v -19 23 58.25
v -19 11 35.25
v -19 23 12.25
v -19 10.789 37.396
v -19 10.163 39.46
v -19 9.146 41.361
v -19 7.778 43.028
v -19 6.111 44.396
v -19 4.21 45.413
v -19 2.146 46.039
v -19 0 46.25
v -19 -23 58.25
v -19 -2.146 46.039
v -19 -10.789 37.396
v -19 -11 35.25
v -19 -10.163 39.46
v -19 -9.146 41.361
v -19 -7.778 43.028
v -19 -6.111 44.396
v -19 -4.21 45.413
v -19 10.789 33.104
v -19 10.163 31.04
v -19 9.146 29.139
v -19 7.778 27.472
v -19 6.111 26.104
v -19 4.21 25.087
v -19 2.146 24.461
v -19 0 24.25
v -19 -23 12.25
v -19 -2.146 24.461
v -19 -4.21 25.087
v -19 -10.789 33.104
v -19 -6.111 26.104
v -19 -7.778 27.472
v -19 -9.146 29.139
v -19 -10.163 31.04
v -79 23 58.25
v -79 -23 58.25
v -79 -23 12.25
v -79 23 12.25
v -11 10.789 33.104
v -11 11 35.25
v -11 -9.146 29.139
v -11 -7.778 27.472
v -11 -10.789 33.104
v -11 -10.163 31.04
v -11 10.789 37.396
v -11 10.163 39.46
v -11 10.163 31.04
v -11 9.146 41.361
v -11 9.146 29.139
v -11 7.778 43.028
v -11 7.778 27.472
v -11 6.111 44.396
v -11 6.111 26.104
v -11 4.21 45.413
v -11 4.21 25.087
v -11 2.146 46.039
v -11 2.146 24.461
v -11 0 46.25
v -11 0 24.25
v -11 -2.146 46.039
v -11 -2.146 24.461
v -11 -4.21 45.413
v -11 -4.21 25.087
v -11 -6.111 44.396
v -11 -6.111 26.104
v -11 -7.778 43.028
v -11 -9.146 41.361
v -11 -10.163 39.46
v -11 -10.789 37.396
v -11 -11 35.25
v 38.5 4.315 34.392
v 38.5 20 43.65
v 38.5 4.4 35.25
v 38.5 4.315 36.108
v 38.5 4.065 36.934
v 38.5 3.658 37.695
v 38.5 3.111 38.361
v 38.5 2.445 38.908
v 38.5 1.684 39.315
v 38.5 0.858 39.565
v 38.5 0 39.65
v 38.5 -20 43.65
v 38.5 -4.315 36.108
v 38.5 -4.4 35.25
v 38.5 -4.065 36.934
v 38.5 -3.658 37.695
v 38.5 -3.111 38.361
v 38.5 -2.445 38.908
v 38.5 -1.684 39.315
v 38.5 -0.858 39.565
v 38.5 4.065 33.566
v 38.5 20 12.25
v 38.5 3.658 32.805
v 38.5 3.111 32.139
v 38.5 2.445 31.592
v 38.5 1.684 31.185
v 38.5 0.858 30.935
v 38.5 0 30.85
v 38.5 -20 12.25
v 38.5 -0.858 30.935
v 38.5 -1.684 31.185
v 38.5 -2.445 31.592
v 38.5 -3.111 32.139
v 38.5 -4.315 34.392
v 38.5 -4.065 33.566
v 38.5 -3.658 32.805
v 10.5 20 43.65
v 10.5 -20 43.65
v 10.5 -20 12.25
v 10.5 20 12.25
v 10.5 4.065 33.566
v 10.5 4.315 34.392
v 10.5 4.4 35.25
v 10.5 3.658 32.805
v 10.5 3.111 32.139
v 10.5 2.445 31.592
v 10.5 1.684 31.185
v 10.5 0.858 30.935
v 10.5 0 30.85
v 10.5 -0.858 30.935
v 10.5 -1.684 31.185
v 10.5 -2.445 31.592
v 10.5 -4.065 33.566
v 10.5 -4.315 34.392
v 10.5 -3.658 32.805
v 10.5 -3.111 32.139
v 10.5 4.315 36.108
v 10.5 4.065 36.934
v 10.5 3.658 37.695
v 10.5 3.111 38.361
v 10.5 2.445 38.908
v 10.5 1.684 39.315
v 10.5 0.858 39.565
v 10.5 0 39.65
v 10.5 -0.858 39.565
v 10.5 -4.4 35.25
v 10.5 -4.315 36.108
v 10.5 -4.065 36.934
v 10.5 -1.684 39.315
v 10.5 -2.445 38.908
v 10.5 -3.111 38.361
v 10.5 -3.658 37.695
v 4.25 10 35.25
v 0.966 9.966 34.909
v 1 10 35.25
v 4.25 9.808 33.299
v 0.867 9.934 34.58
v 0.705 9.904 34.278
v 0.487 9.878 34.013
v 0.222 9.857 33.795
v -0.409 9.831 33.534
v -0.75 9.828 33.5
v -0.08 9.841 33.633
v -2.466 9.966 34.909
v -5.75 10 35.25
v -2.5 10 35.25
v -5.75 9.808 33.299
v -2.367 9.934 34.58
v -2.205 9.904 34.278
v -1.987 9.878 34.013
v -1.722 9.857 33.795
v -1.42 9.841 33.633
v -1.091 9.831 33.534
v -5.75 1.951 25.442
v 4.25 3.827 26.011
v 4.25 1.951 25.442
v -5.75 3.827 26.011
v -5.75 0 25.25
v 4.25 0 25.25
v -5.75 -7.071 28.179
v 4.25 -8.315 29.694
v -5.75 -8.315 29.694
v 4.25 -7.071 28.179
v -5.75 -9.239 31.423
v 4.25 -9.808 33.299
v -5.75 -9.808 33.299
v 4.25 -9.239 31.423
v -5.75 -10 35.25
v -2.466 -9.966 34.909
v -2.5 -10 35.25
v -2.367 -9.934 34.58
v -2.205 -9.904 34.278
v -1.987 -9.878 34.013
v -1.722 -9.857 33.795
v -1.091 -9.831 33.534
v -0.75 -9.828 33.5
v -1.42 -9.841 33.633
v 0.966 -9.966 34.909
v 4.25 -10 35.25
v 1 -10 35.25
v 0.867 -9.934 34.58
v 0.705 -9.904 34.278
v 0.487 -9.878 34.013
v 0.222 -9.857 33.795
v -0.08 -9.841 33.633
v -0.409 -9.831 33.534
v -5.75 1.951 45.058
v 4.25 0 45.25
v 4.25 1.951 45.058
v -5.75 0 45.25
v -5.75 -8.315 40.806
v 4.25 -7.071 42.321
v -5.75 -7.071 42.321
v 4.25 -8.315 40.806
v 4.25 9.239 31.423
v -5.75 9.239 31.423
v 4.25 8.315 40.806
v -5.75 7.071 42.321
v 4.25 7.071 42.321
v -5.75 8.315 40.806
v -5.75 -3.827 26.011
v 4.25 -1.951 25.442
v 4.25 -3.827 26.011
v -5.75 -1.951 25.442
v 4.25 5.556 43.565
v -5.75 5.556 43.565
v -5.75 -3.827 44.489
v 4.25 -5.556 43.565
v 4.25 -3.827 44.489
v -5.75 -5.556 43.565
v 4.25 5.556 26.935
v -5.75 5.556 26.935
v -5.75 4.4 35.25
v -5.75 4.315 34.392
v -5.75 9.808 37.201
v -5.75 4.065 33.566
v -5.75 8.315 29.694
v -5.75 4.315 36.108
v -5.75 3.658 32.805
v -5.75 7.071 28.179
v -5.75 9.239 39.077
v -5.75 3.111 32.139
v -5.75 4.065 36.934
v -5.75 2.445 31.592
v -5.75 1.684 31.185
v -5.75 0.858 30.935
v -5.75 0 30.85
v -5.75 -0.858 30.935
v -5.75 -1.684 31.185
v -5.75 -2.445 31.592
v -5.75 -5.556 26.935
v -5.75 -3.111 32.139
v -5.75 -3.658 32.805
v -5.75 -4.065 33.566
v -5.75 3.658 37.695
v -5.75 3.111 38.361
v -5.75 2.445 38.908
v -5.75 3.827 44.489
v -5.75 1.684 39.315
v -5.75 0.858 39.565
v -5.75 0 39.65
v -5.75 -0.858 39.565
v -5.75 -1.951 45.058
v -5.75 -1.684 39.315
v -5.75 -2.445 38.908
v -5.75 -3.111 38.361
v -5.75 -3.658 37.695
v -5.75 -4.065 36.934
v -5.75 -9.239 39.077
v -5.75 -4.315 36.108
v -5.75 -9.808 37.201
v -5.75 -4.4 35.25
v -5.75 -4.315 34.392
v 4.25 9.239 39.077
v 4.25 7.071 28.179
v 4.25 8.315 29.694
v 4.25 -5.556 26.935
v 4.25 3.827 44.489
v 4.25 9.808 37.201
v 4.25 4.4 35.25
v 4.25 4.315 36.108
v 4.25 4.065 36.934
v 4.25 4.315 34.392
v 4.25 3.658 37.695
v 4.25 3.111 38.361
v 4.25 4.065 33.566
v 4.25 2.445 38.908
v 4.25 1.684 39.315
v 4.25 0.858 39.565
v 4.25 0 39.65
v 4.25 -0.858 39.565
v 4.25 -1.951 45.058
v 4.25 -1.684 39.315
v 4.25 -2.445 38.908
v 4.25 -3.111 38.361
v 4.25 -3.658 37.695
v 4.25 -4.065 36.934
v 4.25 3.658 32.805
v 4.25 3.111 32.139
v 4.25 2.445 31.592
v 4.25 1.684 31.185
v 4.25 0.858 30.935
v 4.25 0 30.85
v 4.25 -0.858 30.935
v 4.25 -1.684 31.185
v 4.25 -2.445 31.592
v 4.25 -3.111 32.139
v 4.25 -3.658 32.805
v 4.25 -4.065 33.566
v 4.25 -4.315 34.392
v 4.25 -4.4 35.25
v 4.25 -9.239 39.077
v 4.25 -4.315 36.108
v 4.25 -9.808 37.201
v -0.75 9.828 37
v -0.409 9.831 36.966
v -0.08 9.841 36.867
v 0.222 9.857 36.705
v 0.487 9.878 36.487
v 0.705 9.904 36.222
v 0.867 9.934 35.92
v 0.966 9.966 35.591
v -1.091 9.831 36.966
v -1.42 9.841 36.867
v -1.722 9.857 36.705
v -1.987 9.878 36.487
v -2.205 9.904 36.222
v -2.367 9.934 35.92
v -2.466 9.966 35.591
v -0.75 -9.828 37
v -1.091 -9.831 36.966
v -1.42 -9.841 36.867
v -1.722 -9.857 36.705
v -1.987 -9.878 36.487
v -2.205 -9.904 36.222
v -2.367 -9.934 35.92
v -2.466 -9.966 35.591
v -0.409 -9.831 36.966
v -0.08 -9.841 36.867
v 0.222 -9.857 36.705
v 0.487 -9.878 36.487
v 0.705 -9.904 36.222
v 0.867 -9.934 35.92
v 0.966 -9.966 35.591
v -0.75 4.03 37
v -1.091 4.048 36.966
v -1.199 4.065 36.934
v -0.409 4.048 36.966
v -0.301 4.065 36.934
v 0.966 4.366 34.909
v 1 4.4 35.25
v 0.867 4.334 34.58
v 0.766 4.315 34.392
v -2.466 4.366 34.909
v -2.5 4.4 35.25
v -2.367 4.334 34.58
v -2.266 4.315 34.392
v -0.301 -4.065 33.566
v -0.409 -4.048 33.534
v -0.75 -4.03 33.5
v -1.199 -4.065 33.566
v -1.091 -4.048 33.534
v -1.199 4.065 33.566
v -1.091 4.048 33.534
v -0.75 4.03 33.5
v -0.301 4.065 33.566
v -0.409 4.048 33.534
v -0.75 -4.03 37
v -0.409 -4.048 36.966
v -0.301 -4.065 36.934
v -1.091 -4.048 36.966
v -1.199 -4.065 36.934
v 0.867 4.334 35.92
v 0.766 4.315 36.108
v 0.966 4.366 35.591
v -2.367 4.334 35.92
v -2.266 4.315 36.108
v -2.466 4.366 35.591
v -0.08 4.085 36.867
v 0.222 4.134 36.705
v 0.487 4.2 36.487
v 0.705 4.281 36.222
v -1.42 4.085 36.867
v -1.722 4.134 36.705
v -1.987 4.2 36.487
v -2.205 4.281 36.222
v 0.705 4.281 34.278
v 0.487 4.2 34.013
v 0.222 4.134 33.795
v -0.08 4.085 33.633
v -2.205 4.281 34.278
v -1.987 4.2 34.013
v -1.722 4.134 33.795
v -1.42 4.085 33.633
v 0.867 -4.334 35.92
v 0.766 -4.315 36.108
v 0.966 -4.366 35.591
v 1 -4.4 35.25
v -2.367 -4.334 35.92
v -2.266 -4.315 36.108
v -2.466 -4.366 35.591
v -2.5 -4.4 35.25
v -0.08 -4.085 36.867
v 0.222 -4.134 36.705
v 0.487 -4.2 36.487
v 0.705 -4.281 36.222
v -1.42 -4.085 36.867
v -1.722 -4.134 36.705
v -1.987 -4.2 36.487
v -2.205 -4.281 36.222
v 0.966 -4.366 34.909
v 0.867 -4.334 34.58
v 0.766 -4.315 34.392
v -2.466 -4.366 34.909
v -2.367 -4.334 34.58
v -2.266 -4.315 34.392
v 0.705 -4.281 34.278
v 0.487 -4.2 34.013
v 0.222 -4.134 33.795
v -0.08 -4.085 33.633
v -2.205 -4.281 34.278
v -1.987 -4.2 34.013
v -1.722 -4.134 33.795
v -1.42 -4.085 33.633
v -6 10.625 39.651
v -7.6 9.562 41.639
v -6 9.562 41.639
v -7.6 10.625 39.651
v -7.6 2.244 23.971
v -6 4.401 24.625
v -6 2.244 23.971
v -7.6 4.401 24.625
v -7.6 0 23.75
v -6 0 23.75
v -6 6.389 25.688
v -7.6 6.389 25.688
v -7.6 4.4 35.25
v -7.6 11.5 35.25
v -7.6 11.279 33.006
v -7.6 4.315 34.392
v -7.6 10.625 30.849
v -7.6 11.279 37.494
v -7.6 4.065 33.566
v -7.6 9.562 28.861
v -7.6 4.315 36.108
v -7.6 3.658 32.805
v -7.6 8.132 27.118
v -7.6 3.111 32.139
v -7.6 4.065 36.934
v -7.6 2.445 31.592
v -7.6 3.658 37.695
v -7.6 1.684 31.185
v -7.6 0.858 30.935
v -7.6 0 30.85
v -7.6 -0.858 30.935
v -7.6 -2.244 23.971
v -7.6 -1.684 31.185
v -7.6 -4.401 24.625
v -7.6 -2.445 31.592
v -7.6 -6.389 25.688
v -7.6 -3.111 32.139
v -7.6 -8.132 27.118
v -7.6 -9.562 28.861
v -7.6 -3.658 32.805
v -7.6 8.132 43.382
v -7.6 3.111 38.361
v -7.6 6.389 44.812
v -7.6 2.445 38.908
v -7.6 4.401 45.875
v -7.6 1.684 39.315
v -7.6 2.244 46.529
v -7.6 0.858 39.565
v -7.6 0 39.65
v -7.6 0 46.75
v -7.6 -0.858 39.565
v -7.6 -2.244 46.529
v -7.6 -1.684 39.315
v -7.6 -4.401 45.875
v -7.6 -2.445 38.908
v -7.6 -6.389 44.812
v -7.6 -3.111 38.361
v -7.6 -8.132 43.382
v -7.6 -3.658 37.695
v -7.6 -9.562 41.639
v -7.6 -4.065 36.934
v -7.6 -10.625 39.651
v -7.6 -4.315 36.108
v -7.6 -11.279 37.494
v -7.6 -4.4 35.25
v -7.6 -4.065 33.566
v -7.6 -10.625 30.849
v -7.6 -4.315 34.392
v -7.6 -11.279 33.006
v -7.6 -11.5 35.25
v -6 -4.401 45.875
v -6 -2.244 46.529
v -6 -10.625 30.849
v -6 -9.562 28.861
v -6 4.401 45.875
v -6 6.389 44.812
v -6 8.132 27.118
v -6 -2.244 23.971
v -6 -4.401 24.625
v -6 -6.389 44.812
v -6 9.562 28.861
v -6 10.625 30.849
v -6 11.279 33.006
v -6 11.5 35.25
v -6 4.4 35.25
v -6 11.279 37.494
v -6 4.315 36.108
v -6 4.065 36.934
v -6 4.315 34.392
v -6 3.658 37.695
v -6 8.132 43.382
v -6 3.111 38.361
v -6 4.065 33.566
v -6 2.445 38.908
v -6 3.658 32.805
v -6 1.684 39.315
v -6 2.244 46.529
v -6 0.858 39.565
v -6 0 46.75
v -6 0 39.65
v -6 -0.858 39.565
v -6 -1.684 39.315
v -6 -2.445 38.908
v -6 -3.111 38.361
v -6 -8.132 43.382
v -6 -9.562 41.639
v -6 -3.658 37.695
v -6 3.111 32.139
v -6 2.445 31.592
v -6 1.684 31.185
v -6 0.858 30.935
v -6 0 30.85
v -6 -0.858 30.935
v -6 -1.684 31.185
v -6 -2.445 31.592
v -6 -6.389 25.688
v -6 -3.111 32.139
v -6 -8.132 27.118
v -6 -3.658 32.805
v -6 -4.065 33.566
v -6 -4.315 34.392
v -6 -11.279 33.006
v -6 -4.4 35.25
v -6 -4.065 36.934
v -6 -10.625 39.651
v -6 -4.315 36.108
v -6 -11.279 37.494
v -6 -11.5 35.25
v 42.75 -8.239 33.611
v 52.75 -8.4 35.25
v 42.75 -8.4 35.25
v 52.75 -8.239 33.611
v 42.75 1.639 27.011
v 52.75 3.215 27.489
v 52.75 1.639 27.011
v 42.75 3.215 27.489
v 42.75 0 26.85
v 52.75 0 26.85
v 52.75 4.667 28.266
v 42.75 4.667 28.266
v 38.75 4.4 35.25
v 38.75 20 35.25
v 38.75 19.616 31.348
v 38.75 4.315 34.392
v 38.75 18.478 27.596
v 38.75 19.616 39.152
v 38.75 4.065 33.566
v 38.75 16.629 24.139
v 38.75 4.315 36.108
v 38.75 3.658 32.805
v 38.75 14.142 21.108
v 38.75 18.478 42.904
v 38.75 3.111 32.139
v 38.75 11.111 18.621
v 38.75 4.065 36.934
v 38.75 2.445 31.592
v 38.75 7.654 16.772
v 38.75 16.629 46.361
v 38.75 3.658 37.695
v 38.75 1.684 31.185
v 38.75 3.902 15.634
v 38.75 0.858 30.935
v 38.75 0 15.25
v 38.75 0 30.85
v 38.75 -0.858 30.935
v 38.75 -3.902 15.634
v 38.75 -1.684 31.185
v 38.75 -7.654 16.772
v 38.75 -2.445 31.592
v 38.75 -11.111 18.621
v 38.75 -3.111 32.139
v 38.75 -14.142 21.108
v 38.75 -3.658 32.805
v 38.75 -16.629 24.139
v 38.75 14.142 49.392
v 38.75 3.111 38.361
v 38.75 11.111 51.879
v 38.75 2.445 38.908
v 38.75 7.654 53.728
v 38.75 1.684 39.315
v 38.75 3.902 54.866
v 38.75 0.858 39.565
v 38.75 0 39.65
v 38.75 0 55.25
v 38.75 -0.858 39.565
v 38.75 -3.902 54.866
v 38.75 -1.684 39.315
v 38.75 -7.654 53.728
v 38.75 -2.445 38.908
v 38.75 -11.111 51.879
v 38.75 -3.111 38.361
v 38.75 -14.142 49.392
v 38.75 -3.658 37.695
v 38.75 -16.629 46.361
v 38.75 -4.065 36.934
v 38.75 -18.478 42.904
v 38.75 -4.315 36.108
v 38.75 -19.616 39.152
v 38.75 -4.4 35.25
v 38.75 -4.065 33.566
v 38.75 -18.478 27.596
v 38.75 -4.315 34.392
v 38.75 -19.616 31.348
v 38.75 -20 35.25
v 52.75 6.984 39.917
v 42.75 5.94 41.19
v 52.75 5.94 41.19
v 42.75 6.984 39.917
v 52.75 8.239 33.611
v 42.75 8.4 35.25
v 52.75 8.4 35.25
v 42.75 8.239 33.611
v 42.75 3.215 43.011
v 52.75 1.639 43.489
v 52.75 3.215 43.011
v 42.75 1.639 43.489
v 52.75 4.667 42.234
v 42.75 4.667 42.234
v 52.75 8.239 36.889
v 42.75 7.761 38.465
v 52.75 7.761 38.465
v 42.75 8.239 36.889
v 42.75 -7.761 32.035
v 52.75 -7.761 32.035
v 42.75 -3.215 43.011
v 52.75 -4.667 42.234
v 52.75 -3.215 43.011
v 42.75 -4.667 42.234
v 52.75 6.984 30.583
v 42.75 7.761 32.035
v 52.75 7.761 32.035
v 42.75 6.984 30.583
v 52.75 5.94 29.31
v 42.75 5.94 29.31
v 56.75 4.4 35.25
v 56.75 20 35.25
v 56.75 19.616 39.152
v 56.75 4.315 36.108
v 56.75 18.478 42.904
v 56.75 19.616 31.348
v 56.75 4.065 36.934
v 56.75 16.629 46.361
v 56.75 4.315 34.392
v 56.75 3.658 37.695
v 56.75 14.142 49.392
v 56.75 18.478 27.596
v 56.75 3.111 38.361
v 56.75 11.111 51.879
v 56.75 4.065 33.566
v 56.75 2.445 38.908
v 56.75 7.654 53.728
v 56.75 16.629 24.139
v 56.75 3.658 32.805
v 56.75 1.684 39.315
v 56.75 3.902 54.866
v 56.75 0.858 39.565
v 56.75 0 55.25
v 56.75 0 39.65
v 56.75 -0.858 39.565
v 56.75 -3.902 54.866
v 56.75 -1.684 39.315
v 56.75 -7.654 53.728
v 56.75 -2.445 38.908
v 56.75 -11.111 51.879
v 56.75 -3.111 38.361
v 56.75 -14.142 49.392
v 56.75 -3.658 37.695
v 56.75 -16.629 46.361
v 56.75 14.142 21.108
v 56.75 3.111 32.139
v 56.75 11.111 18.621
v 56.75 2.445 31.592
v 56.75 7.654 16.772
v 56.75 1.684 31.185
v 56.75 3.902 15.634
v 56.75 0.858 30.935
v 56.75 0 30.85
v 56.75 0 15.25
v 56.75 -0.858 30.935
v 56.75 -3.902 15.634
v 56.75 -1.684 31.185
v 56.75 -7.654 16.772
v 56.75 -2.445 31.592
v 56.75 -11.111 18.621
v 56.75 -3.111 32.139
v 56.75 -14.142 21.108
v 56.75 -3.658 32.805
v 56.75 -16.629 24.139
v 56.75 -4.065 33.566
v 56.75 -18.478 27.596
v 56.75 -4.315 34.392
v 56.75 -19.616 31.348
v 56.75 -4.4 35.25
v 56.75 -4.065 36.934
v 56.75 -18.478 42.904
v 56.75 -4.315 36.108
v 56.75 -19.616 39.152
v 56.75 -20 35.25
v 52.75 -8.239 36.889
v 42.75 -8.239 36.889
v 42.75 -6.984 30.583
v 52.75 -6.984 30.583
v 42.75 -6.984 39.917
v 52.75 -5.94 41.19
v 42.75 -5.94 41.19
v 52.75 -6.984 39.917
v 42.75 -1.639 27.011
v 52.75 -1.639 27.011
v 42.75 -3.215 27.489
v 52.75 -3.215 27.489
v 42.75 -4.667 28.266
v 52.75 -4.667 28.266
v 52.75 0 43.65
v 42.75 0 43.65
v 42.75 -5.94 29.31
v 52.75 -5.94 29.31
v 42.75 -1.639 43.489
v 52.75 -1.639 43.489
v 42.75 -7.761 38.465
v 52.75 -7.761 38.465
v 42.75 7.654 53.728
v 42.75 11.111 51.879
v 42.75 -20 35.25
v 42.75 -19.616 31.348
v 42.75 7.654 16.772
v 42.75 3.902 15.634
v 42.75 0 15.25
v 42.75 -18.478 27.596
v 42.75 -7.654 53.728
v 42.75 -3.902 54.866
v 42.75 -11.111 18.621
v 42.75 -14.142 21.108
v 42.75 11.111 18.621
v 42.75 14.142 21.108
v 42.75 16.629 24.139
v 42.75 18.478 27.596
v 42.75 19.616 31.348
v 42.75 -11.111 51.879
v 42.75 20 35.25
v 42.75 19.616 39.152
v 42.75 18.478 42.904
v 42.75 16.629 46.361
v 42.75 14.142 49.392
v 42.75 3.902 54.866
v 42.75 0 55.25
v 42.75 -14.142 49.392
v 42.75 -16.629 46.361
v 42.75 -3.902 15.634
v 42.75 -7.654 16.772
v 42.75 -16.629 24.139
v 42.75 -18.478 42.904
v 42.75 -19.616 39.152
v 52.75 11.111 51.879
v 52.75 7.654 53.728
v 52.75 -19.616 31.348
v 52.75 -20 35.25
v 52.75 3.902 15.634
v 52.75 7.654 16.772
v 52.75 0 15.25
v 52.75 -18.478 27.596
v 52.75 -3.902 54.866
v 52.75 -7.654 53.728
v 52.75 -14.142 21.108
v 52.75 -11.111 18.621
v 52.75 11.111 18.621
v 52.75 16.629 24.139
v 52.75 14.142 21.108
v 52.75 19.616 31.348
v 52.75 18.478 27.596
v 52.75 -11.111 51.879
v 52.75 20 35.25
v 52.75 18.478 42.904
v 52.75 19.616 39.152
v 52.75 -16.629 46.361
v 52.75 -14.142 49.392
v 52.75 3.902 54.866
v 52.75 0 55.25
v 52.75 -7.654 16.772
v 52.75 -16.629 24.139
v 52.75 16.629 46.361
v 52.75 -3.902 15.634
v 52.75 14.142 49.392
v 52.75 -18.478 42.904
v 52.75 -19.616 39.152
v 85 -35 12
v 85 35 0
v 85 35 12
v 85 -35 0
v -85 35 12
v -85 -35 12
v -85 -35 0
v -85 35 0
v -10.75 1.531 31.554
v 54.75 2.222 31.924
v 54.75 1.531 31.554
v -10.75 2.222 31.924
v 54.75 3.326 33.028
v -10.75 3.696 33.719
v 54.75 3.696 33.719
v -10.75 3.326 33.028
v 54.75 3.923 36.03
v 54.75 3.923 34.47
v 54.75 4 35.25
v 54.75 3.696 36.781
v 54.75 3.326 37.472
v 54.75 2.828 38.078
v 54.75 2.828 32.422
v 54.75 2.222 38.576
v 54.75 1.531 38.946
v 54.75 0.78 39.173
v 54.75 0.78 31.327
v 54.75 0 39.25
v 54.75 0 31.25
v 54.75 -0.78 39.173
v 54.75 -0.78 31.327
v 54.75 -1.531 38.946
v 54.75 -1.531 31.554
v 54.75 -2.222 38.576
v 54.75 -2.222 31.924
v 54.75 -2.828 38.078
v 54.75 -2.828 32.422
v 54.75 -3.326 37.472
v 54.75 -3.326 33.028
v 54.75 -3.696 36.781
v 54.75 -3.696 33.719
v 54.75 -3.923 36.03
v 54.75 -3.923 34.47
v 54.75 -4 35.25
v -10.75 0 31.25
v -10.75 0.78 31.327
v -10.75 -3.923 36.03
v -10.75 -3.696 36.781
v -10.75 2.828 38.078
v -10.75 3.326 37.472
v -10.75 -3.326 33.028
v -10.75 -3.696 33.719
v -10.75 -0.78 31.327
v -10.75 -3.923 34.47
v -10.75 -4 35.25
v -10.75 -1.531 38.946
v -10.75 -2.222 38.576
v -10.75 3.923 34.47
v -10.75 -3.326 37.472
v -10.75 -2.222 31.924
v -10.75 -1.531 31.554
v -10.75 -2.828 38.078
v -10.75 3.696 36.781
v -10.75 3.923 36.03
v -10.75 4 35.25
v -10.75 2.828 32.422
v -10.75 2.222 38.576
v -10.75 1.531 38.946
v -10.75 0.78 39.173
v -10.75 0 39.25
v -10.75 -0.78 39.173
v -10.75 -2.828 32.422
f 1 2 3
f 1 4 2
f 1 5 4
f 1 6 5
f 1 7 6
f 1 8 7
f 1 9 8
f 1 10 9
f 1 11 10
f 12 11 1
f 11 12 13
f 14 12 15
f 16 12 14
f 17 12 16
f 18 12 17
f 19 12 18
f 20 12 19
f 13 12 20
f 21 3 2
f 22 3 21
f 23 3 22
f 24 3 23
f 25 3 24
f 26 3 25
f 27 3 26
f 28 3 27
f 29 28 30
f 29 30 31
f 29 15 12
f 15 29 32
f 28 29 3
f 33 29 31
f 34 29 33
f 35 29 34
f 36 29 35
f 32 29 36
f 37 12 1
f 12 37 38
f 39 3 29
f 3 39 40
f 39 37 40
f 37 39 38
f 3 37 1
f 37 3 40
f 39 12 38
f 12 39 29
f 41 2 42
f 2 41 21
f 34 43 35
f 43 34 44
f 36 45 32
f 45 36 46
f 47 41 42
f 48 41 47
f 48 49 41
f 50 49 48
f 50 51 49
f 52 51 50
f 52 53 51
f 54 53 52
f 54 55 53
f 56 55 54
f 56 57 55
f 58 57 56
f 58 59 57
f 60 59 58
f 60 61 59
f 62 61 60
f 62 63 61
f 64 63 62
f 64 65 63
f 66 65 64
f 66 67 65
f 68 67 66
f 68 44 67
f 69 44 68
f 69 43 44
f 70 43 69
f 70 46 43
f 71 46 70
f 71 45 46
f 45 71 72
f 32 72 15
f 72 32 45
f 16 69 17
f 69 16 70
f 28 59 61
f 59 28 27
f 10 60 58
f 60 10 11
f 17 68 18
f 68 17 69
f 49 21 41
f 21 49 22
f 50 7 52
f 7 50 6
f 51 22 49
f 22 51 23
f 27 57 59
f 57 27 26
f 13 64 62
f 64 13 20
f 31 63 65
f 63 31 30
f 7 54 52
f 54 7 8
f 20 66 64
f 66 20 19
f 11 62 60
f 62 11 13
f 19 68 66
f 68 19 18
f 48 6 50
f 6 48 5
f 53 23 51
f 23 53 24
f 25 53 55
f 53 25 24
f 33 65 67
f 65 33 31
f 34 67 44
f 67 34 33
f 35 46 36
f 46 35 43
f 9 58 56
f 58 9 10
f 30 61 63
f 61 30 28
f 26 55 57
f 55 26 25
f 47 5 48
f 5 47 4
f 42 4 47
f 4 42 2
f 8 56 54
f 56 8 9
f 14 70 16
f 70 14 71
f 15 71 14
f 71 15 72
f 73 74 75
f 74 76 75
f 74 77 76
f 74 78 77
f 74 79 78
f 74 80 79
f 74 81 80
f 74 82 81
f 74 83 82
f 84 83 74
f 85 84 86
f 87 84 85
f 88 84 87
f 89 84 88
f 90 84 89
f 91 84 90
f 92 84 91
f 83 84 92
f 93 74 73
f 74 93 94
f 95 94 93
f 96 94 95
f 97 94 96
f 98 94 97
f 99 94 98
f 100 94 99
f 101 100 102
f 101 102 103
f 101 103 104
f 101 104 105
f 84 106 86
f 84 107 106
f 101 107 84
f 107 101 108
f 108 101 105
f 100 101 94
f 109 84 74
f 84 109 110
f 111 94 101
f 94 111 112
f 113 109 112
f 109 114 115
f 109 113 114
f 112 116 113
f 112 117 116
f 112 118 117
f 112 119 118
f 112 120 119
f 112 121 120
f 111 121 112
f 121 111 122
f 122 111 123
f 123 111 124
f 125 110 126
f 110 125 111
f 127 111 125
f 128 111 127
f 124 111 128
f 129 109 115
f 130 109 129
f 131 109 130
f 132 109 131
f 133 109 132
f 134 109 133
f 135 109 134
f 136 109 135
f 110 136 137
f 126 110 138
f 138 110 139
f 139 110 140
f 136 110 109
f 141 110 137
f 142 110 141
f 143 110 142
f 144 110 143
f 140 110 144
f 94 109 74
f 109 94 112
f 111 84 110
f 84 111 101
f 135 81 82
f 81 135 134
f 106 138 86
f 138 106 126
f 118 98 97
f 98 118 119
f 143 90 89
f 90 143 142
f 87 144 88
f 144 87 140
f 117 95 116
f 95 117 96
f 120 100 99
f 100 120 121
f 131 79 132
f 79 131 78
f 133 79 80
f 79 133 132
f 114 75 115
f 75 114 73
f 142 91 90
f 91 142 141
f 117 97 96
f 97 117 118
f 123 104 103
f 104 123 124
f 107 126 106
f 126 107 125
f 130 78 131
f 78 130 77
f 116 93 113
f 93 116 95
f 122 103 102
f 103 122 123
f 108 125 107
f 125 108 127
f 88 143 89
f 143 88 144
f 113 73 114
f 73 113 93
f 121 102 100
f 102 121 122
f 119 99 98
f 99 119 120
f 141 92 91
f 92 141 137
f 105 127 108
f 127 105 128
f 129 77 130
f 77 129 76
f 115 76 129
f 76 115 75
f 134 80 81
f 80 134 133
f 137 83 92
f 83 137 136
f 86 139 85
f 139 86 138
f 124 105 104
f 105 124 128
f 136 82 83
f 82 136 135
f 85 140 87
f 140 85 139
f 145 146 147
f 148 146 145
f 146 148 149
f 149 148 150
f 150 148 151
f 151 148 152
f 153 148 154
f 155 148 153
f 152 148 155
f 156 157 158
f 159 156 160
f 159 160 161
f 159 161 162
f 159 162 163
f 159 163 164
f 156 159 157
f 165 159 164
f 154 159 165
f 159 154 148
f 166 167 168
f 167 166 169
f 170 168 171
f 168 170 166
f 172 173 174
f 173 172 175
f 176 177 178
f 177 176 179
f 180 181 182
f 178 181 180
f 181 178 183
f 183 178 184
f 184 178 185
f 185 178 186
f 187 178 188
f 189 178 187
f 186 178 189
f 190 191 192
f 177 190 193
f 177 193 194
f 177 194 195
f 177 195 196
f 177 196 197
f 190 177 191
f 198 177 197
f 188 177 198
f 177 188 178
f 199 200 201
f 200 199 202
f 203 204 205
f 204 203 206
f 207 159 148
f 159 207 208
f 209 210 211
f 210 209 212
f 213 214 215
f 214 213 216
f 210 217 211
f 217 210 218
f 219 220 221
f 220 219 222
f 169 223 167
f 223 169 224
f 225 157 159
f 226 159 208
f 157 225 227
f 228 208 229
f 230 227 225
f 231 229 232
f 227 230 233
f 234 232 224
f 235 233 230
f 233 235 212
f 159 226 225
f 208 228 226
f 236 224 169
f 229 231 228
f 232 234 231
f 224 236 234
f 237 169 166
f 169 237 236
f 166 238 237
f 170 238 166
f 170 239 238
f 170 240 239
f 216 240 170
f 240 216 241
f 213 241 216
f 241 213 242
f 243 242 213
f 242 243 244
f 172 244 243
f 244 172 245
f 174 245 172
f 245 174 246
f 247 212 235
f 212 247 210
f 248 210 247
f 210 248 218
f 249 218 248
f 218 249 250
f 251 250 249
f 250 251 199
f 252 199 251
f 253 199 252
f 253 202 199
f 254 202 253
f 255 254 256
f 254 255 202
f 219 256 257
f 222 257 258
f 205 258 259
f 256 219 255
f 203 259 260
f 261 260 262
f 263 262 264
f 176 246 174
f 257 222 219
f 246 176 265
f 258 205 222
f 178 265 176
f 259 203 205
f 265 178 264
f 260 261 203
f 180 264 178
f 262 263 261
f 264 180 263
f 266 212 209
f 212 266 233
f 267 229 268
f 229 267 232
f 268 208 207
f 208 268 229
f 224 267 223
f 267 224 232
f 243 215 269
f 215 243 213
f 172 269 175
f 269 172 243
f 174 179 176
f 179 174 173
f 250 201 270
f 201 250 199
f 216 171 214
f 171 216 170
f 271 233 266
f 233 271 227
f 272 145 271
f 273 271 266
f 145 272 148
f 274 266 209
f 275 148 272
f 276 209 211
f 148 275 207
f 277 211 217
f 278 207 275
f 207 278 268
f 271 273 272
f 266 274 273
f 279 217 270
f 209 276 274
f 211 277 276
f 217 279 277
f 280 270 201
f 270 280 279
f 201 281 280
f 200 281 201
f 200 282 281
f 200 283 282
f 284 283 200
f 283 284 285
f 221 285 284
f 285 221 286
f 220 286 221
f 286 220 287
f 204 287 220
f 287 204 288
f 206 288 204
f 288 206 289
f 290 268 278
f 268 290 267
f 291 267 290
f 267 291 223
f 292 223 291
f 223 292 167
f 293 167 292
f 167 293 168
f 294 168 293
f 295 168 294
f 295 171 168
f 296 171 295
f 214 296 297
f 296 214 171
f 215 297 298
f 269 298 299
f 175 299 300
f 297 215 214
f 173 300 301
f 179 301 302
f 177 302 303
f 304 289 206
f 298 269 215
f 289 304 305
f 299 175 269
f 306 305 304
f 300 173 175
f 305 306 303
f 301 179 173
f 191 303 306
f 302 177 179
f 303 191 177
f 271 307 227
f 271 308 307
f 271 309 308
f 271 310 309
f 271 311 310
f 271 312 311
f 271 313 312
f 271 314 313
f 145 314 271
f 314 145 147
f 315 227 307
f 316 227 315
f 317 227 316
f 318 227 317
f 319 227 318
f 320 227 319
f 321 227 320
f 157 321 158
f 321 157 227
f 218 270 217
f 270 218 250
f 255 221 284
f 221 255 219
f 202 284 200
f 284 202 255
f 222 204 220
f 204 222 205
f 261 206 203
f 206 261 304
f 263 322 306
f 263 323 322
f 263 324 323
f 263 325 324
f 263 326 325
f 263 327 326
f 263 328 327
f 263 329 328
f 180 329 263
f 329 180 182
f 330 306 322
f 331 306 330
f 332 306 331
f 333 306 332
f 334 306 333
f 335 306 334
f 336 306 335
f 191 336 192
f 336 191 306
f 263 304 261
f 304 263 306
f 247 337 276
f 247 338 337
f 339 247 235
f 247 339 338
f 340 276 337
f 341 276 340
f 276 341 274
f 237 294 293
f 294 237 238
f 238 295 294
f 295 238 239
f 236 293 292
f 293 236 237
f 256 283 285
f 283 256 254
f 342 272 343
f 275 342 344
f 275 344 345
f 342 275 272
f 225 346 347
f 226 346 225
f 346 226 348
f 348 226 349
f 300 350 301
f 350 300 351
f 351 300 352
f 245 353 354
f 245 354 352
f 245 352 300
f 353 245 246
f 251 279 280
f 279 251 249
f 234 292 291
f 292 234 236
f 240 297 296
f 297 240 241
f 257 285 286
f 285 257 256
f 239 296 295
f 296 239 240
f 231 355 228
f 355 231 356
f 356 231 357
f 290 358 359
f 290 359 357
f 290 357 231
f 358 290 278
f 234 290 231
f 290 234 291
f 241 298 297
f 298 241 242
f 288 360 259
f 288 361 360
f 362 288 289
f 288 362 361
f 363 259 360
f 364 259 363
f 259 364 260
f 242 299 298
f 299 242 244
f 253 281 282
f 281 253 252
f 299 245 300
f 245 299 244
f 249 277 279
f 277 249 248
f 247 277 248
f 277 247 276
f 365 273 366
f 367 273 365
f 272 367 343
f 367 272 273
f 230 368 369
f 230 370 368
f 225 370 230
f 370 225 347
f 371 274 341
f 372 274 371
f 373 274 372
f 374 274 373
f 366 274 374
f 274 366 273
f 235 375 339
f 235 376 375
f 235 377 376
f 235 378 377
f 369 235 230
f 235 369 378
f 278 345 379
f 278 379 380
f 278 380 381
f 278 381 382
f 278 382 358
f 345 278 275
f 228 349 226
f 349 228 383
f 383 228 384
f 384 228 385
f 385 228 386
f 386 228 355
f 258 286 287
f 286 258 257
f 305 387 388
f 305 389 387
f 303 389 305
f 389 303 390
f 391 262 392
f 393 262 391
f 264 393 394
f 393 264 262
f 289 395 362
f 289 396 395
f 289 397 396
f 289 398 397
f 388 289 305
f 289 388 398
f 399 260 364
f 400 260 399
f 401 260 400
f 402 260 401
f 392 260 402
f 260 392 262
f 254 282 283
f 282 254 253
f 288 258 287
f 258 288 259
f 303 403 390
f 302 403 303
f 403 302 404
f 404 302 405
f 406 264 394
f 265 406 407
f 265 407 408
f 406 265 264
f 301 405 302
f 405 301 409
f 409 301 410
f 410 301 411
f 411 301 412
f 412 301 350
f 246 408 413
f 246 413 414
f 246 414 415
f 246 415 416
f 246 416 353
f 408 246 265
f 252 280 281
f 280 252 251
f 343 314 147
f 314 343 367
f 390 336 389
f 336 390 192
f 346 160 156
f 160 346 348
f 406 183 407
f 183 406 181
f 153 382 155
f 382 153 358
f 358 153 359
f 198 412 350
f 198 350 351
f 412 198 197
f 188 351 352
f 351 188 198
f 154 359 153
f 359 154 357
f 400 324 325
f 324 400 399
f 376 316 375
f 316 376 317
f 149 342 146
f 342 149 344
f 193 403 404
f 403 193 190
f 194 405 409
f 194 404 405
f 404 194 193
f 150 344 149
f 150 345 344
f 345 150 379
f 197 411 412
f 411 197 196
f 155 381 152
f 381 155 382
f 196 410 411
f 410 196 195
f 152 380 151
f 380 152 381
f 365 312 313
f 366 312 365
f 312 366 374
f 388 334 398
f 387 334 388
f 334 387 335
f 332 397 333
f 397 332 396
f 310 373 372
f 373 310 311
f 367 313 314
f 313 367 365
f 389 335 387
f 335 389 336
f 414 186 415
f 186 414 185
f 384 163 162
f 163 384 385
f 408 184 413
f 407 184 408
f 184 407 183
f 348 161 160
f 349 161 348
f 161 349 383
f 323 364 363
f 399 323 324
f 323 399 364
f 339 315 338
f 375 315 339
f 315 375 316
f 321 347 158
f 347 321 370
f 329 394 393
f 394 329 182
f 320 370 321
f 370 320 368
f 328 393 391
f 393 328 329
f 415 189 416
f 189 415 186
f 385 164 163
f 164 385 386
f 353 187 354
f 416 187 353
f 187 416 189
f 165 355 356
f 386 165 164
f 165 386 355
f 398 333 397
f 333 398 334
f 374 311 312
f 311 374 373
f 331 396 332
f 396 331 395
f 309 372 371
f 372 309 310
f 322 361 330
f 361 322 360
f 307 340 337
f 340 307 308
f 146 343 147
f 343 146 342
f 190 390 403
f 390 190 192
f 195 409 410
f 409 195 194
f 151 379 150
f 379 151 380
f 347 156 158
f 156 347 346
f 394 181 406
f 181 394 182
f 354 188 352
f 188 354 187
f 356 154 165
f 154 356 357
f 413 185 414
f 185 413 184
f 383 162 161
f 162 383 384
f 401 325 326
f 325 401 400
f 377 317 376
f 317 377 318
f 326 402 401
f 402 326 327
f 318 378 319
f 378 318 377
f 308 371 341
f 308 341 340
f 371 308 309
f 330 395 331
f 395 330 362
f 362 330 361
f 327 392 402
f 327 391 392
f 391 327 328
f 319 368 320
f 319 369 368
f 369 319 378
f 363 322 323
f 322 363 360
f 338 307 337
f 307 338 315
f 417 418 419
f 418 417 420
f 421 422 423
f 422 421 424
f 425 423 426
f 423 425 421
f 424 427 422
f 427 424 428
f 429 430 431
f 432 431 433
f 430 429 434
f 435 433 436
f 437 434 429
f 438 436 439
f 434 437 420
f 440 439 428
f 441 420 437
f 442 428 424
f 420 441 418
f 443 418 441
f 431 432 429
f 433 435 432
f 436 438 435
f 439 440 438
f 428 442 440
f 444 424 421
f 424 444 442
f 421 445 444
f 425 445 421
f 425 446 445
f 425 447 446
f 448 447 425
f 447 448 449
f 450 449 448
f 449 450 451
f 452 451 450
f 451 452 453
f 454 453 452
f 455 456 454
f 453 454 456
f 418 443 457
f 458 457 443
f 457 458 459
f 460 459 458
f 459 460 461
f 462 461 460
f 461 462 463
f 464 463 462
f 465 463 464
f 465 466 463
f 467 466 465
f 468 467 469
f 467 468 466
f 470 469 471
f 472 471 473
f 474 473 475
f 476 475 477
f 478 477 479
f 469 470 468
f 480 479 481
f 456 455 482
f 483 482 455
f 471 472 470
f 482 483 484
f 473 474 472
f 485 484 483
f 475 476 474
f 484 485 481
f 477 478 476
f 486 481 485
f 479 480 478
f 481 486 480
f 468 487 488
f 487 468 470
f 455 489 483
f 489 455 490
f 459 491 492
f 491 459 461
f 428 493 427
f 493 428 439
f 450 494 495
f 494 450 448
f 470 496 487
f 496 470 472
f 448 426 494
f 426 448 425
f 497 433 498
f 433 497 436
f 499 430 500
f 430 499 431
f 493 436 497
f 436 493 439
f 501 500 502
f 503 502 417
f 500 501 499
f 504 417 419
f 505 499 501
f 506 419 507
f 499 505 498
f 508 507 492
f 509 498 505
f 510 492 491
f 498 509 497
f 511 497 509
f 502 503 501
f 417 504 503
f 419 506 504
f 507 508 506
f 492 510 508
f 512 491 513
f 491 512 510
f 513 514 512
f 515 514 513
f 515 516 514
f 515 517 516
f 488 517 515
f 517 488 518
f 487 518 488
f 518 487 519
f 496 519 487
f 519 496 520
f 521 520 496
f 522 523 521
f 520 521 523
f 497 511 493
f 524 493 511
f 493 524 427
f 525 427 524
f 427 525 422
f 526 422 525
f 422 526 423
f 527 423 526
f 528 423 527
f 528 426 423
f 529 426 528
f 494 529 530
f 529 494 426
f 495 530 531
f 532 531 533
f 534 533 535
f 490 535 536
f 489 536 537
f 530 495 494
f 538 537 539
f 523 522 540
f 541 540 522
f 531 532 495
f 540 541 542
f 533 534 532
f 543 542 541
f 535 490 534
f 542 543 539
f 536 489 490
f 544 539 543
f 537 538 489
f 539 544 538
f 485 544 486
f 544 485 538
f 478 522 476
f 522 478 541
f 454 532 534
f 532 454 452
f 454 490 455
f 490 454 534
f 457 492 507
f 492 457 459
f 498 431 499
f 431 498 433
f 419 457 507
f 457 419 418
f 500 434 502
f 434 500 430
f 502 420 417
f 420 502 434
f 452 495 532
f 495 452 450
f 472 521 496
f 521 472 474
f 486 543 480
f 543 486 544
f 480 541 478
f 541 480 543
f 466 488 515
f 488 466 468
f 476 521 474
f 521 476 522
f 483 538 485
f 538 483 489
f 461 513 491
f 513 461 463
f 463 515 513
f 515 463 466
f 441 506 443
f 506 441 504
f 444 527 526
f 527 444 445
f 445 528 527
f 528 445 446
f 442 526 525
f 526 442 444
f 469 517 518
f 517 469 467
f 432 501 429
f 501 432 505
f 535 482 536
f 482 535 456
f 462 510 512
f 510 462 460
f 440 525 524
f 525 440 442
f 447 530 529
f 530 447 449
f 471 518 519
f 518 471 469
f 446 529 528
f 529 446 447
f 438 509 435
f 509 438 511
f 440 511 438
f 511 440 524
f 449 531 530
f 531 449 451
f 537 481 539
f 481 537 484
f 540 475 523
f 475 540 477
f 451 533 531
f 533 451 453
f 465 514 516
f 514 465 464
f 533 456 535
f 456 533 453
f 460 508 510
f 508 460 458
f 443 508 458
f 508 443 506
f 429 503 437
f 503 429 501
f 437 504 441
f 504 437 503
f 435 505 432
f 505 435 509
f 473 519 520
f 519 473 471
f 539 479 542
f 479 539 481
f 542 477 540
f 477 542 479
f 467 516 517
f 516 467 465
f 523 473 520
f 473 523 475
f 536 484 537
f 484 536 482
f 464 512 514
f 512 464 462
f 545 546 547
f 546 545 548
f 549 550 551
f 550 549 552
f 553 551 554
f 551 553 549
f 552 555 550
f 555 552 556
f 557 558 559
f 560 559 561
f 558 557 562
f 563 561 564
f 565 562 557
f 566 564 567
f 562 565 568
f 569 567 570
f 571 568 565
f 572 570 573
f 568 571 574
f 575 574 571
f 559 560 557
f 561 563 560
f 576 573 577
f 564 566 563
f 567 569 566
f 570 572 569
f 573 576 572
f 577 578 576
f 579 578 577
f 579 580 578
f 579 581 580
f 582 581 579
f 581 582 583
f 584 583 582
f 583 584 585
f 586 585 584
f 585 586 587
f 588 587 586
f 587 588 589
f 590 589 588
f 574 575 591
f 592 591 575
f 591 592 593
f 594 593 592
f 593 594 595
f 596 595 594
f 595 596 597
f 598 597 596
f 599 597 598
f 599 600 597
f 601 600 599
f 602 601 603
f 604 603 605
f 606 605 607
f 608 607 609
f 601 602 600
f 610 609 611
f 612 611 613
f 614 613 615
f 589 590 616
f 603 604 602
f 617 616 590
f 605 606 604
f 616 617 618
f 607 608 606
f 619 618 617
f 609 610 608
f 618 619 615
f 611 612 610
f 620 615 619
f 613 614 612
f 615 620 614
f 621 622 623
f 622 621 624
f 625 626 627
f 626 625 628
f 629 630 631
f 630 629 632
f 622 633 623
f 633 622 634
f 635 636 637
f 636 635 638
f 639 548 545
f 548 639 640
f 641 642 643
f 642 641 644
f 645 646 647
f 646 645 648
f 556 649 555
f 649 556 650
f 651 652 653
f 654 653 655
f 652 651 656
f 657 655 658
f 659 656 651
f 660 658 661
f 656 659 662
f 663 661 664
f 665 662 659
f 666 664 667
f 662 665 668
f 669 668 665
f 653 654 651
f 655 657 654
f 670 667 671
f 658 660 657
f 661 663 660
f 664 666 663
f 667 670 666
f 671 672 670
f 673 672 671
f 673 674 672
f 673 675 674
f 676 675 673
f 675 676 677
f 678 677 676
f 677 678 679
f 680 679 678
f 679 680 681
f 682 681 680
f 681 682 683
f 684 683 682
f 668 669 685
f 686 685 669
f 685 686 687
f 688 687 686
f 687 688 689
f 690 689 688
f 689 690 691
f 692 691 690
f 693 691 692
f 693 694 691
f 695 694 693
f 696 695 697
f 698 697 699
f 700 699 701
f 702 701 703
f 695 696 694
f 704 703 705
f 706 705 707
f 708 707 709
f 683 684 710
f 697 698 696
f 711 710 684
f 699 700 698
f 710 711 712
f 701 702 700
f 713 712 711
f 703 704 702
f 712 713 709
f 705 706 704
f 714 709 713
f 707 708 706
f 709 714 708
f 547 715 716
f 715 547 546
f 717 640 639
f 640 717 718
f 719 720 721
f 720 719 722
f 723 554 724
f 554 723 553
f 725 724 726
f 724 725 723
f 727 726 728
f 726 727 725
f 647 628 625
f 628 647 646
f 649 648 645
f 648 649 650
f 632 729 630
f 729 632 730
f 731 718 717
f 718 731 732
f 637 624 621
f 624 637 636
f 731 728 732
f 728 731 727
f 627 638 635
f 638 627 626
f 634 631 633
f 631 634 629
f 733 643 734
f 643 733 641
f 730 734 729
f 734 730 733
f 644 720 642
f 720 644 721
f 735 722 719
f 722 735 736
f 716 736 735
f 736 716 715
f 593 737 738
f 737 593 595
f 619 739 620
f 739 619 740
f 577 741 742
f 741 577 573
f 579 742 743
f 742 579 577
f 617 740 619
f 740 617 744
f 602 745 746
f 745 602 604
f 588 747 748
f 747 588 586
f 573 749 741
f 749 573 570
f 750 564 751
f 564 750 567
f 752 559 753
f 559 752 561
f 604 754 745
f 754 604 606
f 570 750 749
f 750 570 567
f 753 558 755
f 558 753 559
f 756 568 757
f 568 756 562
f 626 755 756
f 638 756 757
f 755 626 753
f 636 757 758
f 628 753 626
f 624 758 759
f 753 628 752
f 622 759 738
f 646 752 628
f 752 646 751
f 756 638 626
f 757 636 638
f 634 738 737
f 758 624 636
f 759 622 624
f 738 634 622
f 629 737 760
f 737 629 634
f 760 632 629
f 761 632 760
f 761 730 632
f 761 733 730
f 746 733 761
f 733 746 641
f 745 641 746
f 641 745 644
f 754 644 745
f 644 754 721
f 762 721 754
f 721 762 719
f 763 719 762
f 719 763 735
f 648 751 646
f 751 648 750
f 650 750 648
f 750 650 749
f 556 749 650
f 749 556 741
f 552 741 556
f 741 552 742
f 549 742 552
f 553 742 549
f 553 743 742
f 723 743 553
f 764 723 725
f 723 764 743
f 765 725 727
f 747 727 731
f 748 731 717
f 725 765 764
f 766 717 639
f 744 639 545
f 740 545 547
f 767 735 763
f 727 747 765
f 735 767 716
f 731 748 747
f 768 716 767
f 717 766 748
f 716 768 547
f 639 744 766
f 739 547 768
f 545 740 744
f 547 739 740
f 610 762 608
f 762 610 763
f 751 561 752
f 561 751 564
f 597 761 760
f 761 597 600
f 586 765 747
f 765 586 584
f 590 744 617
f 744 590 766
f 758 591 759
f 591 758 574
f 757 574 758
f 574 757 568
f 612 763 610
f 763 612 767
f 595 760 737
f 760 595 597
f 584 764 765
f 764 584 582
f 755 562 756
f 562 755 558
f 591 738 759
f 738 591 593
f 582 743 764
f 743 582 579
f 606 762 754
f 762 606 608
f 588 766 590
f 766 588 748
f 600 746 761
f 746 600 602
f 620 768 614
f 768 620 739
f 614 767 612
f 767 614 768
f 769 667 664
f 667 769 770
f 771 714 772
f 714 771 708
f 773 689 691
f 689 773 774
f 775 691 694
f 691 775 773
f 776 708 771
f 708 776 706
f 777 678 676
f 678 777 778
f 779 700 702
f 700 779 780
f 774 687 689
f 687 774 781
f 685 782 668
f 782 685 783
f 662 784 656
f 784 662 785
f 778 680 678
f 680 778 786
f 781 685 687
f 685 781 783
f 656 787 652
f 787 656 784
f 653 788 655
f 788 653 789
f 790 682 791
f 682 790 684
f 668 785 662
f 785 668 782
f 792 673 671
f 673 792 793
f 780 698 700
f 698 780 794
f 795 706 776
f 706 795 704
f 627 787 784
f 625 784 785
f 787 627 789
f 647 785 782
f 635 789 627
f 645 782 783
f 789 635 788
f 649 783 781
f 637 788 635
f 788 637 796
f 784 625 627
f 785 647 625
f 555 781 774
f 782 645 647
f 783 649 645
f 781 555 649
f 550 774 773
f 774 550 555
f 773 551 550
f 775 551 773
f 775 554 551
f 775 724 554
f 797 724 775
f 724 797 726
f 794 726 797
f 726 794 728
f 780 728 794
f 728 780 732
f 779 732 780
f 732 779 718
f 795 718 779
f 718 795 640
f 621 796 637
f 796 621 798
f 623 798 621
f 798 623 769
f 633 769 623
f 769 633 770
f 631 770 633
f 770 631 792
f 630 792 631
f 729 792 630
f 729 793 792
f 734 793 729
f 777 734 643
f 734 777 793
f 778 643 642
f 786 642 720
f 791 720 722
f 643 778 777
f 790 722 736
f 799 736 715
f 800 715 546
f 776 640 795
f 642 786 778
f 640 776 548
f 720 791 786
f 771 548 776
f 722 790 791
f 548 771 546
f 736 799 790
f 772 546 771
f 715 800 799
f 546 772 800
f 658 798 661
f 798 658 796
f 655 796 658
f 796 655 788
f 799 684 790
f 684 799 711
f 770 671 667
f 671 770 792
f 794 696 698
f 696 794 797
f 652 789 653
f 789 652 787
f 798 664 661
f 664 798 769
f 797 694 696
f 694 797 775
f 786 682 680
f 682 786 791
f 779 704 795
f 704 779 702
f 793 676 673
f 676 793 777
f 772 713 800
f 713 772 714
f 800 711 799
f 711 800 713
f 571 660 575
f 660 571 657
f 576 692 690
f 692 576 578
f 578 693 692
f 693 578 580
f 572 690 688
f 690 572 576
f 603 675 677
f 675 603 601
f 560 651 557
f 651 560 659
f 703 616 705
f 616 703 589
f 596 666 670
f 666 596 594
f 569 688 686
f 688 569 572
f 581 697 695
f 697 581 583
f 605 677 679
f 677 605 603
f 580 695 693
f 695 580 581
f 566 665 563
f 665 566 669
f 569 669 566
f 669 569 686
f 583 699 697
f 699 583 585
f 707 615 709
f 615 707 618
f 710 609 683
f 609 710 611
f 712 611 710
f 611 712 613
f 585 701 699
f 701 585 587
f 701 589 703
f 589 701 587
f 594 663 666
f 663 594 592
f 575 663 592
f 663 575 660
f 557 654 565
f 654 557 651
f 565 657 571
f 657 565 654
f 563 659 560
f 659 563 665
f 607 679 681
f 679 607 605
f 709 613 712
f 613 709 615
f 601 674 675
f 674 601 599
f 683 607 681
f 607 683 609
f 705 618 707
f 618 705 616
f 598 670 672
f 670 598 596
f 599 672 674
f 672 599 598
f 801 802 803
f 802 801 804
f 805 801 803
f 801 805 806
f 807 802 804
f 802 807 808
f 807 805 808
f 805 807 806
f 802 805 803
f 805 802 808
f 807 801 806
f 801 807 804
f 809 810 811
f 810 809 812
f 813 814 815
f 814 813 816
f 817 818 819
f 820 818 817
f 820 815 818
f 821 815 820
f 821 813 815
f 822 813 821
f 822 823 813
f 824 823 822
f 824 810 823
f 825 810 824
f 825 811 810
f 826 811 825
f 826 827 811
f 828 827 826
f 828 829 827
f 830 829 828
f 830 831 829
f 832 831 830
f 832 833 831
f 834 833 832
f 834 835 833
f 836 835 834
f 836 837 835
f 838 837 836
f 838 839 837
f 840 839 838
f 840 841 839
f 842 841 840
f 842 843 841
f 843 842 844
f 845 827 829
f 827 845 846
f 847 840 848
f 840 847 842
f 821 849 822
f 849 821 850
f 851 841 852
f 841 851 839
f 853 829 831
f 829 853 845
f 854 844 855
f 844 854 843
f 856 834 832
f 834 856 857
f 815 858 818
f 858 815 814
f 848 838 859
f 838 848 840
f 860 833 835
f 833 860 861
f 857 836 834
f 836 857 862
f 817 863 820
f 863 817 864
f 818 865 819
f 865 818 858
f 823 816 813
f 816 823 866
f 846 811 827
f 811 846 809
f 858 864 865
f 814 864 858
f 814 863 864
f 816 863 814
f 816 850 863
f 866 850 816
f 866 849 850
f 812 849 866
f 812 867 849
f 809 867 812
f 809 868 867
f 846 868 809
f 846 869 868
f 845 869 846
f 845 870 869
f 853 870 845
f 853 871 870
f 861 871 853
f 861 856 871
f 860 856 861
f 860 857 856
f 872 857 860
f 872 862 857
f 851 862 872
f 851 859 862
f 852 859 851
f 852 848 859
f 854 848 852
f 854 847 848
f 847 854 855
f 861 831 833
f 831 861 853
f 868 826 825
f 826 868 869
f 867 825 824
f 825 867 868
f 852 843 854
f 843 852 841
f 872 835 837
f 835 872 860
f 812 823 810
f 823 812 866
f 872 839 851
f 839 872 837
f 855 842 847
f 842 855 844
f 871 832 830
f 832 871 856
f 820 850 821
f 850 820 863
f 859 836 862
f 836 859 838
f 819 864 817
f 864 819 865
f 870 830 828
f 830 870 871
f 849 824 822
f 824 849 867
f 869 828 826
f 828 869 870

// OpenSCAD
$fn = 32;

// ------------------------------------------------------------------------
// Motor drive station: motor 60 x 46 mm, shaft d8, pulley d40
// Every part is its own module, assembly() places every instance.
// ------------------------------------------------------------------------

// --- part 1 ---
module station_bed() {
  difference() {
    translate([-85, -35, 0]) cube([170, 70, 12]);
  }
}

// --- part 2 ---
module drive_motor() {
  union() {
    translate([-30, -23, 0]) cube([60, 46, 46]);
    translate([34, 0, 23]) rotate([0, 90, 0]) cylinder(h = 8, d = 22, center = true);
  }
}

// --- part 3 ---
module pillow_block() {
  difference() {
    translate([-14, -20, 0]) cube([28, 40, 31.4]);
    translate([0, 0, 23]) rotate([0, 90, 0]) cylinder(h = 30, d = 8.8, center = true);
  }
}

// --- part 4 ---
module drive_shaft() {
  translate([0, 0, -32.75]) cylinder(h = 65.5, d = 8);
}

// --- part 5 ---
module shaft_collar() {
  difference() {
    cylinder(h = 10, d = 20);
    translate([0, 0, -1]) cylinder(h = 12, d = 8.8);
    translate([0, 0, 5]) rotate([90, 0, 0]) cylinder(h = 22, d = 3.5, center = true);
  }
}

// --- part 6 ---
module collar_washer() {
  difference() {
      translate([0, 0, 0]) cylinder(h = 1.6, d = 23);
      translate([0, 0, -1]) cylinder(h = 3.6, d = 8.8);
    }
}

// --- part 7 ---
module drive_pulley() {
  difference() {
    union() {
      cylinder(h = 18, d = 16.8);
      cylinder(h = 4, d = 40);
      translate([0, 0, 14]) cylinder(h = 4, d = 40);
    }
    translate([0, 0, -1]) cylinder(h = 20, d = 8.8);
  }
}

// --- assembly ---
module assembly() {
  color([0.80, 0.24, 0.20]) translate([0, 0, 0]) rotate([0, 0, 0]) station_bed();
  color([0.20, 0.45, 0.75]) translate([-49, 0, 12.25]) rotate([0, 0, 0]) drive_motor();
  color([0.25, 0.62, 0.32]) translate([24.5, 0, 12.25]) rotate([0, 0, 0]) pillow_block();
  color([0.92, 0.70, 0.18]) translate([22, 0, 35.25]) rotate([0, 90, 0]) drive_shaft();
  color([0.58, 0.35, 0.70]) translate([-5.75, 0, 35.25]) rotate([0, 90, 0]) shaft_collar();
  color([0.16, 0.66, 0.66]) translate([-7.6, 0, 35.25]) rotate([0, 90, 0]) collar_washer();
  color([0.85, 0.48, 0.18]) translate([38.75, 0, 35.25]) rotate([0, 90, 0]) drive_pulley();
}

assembly();
